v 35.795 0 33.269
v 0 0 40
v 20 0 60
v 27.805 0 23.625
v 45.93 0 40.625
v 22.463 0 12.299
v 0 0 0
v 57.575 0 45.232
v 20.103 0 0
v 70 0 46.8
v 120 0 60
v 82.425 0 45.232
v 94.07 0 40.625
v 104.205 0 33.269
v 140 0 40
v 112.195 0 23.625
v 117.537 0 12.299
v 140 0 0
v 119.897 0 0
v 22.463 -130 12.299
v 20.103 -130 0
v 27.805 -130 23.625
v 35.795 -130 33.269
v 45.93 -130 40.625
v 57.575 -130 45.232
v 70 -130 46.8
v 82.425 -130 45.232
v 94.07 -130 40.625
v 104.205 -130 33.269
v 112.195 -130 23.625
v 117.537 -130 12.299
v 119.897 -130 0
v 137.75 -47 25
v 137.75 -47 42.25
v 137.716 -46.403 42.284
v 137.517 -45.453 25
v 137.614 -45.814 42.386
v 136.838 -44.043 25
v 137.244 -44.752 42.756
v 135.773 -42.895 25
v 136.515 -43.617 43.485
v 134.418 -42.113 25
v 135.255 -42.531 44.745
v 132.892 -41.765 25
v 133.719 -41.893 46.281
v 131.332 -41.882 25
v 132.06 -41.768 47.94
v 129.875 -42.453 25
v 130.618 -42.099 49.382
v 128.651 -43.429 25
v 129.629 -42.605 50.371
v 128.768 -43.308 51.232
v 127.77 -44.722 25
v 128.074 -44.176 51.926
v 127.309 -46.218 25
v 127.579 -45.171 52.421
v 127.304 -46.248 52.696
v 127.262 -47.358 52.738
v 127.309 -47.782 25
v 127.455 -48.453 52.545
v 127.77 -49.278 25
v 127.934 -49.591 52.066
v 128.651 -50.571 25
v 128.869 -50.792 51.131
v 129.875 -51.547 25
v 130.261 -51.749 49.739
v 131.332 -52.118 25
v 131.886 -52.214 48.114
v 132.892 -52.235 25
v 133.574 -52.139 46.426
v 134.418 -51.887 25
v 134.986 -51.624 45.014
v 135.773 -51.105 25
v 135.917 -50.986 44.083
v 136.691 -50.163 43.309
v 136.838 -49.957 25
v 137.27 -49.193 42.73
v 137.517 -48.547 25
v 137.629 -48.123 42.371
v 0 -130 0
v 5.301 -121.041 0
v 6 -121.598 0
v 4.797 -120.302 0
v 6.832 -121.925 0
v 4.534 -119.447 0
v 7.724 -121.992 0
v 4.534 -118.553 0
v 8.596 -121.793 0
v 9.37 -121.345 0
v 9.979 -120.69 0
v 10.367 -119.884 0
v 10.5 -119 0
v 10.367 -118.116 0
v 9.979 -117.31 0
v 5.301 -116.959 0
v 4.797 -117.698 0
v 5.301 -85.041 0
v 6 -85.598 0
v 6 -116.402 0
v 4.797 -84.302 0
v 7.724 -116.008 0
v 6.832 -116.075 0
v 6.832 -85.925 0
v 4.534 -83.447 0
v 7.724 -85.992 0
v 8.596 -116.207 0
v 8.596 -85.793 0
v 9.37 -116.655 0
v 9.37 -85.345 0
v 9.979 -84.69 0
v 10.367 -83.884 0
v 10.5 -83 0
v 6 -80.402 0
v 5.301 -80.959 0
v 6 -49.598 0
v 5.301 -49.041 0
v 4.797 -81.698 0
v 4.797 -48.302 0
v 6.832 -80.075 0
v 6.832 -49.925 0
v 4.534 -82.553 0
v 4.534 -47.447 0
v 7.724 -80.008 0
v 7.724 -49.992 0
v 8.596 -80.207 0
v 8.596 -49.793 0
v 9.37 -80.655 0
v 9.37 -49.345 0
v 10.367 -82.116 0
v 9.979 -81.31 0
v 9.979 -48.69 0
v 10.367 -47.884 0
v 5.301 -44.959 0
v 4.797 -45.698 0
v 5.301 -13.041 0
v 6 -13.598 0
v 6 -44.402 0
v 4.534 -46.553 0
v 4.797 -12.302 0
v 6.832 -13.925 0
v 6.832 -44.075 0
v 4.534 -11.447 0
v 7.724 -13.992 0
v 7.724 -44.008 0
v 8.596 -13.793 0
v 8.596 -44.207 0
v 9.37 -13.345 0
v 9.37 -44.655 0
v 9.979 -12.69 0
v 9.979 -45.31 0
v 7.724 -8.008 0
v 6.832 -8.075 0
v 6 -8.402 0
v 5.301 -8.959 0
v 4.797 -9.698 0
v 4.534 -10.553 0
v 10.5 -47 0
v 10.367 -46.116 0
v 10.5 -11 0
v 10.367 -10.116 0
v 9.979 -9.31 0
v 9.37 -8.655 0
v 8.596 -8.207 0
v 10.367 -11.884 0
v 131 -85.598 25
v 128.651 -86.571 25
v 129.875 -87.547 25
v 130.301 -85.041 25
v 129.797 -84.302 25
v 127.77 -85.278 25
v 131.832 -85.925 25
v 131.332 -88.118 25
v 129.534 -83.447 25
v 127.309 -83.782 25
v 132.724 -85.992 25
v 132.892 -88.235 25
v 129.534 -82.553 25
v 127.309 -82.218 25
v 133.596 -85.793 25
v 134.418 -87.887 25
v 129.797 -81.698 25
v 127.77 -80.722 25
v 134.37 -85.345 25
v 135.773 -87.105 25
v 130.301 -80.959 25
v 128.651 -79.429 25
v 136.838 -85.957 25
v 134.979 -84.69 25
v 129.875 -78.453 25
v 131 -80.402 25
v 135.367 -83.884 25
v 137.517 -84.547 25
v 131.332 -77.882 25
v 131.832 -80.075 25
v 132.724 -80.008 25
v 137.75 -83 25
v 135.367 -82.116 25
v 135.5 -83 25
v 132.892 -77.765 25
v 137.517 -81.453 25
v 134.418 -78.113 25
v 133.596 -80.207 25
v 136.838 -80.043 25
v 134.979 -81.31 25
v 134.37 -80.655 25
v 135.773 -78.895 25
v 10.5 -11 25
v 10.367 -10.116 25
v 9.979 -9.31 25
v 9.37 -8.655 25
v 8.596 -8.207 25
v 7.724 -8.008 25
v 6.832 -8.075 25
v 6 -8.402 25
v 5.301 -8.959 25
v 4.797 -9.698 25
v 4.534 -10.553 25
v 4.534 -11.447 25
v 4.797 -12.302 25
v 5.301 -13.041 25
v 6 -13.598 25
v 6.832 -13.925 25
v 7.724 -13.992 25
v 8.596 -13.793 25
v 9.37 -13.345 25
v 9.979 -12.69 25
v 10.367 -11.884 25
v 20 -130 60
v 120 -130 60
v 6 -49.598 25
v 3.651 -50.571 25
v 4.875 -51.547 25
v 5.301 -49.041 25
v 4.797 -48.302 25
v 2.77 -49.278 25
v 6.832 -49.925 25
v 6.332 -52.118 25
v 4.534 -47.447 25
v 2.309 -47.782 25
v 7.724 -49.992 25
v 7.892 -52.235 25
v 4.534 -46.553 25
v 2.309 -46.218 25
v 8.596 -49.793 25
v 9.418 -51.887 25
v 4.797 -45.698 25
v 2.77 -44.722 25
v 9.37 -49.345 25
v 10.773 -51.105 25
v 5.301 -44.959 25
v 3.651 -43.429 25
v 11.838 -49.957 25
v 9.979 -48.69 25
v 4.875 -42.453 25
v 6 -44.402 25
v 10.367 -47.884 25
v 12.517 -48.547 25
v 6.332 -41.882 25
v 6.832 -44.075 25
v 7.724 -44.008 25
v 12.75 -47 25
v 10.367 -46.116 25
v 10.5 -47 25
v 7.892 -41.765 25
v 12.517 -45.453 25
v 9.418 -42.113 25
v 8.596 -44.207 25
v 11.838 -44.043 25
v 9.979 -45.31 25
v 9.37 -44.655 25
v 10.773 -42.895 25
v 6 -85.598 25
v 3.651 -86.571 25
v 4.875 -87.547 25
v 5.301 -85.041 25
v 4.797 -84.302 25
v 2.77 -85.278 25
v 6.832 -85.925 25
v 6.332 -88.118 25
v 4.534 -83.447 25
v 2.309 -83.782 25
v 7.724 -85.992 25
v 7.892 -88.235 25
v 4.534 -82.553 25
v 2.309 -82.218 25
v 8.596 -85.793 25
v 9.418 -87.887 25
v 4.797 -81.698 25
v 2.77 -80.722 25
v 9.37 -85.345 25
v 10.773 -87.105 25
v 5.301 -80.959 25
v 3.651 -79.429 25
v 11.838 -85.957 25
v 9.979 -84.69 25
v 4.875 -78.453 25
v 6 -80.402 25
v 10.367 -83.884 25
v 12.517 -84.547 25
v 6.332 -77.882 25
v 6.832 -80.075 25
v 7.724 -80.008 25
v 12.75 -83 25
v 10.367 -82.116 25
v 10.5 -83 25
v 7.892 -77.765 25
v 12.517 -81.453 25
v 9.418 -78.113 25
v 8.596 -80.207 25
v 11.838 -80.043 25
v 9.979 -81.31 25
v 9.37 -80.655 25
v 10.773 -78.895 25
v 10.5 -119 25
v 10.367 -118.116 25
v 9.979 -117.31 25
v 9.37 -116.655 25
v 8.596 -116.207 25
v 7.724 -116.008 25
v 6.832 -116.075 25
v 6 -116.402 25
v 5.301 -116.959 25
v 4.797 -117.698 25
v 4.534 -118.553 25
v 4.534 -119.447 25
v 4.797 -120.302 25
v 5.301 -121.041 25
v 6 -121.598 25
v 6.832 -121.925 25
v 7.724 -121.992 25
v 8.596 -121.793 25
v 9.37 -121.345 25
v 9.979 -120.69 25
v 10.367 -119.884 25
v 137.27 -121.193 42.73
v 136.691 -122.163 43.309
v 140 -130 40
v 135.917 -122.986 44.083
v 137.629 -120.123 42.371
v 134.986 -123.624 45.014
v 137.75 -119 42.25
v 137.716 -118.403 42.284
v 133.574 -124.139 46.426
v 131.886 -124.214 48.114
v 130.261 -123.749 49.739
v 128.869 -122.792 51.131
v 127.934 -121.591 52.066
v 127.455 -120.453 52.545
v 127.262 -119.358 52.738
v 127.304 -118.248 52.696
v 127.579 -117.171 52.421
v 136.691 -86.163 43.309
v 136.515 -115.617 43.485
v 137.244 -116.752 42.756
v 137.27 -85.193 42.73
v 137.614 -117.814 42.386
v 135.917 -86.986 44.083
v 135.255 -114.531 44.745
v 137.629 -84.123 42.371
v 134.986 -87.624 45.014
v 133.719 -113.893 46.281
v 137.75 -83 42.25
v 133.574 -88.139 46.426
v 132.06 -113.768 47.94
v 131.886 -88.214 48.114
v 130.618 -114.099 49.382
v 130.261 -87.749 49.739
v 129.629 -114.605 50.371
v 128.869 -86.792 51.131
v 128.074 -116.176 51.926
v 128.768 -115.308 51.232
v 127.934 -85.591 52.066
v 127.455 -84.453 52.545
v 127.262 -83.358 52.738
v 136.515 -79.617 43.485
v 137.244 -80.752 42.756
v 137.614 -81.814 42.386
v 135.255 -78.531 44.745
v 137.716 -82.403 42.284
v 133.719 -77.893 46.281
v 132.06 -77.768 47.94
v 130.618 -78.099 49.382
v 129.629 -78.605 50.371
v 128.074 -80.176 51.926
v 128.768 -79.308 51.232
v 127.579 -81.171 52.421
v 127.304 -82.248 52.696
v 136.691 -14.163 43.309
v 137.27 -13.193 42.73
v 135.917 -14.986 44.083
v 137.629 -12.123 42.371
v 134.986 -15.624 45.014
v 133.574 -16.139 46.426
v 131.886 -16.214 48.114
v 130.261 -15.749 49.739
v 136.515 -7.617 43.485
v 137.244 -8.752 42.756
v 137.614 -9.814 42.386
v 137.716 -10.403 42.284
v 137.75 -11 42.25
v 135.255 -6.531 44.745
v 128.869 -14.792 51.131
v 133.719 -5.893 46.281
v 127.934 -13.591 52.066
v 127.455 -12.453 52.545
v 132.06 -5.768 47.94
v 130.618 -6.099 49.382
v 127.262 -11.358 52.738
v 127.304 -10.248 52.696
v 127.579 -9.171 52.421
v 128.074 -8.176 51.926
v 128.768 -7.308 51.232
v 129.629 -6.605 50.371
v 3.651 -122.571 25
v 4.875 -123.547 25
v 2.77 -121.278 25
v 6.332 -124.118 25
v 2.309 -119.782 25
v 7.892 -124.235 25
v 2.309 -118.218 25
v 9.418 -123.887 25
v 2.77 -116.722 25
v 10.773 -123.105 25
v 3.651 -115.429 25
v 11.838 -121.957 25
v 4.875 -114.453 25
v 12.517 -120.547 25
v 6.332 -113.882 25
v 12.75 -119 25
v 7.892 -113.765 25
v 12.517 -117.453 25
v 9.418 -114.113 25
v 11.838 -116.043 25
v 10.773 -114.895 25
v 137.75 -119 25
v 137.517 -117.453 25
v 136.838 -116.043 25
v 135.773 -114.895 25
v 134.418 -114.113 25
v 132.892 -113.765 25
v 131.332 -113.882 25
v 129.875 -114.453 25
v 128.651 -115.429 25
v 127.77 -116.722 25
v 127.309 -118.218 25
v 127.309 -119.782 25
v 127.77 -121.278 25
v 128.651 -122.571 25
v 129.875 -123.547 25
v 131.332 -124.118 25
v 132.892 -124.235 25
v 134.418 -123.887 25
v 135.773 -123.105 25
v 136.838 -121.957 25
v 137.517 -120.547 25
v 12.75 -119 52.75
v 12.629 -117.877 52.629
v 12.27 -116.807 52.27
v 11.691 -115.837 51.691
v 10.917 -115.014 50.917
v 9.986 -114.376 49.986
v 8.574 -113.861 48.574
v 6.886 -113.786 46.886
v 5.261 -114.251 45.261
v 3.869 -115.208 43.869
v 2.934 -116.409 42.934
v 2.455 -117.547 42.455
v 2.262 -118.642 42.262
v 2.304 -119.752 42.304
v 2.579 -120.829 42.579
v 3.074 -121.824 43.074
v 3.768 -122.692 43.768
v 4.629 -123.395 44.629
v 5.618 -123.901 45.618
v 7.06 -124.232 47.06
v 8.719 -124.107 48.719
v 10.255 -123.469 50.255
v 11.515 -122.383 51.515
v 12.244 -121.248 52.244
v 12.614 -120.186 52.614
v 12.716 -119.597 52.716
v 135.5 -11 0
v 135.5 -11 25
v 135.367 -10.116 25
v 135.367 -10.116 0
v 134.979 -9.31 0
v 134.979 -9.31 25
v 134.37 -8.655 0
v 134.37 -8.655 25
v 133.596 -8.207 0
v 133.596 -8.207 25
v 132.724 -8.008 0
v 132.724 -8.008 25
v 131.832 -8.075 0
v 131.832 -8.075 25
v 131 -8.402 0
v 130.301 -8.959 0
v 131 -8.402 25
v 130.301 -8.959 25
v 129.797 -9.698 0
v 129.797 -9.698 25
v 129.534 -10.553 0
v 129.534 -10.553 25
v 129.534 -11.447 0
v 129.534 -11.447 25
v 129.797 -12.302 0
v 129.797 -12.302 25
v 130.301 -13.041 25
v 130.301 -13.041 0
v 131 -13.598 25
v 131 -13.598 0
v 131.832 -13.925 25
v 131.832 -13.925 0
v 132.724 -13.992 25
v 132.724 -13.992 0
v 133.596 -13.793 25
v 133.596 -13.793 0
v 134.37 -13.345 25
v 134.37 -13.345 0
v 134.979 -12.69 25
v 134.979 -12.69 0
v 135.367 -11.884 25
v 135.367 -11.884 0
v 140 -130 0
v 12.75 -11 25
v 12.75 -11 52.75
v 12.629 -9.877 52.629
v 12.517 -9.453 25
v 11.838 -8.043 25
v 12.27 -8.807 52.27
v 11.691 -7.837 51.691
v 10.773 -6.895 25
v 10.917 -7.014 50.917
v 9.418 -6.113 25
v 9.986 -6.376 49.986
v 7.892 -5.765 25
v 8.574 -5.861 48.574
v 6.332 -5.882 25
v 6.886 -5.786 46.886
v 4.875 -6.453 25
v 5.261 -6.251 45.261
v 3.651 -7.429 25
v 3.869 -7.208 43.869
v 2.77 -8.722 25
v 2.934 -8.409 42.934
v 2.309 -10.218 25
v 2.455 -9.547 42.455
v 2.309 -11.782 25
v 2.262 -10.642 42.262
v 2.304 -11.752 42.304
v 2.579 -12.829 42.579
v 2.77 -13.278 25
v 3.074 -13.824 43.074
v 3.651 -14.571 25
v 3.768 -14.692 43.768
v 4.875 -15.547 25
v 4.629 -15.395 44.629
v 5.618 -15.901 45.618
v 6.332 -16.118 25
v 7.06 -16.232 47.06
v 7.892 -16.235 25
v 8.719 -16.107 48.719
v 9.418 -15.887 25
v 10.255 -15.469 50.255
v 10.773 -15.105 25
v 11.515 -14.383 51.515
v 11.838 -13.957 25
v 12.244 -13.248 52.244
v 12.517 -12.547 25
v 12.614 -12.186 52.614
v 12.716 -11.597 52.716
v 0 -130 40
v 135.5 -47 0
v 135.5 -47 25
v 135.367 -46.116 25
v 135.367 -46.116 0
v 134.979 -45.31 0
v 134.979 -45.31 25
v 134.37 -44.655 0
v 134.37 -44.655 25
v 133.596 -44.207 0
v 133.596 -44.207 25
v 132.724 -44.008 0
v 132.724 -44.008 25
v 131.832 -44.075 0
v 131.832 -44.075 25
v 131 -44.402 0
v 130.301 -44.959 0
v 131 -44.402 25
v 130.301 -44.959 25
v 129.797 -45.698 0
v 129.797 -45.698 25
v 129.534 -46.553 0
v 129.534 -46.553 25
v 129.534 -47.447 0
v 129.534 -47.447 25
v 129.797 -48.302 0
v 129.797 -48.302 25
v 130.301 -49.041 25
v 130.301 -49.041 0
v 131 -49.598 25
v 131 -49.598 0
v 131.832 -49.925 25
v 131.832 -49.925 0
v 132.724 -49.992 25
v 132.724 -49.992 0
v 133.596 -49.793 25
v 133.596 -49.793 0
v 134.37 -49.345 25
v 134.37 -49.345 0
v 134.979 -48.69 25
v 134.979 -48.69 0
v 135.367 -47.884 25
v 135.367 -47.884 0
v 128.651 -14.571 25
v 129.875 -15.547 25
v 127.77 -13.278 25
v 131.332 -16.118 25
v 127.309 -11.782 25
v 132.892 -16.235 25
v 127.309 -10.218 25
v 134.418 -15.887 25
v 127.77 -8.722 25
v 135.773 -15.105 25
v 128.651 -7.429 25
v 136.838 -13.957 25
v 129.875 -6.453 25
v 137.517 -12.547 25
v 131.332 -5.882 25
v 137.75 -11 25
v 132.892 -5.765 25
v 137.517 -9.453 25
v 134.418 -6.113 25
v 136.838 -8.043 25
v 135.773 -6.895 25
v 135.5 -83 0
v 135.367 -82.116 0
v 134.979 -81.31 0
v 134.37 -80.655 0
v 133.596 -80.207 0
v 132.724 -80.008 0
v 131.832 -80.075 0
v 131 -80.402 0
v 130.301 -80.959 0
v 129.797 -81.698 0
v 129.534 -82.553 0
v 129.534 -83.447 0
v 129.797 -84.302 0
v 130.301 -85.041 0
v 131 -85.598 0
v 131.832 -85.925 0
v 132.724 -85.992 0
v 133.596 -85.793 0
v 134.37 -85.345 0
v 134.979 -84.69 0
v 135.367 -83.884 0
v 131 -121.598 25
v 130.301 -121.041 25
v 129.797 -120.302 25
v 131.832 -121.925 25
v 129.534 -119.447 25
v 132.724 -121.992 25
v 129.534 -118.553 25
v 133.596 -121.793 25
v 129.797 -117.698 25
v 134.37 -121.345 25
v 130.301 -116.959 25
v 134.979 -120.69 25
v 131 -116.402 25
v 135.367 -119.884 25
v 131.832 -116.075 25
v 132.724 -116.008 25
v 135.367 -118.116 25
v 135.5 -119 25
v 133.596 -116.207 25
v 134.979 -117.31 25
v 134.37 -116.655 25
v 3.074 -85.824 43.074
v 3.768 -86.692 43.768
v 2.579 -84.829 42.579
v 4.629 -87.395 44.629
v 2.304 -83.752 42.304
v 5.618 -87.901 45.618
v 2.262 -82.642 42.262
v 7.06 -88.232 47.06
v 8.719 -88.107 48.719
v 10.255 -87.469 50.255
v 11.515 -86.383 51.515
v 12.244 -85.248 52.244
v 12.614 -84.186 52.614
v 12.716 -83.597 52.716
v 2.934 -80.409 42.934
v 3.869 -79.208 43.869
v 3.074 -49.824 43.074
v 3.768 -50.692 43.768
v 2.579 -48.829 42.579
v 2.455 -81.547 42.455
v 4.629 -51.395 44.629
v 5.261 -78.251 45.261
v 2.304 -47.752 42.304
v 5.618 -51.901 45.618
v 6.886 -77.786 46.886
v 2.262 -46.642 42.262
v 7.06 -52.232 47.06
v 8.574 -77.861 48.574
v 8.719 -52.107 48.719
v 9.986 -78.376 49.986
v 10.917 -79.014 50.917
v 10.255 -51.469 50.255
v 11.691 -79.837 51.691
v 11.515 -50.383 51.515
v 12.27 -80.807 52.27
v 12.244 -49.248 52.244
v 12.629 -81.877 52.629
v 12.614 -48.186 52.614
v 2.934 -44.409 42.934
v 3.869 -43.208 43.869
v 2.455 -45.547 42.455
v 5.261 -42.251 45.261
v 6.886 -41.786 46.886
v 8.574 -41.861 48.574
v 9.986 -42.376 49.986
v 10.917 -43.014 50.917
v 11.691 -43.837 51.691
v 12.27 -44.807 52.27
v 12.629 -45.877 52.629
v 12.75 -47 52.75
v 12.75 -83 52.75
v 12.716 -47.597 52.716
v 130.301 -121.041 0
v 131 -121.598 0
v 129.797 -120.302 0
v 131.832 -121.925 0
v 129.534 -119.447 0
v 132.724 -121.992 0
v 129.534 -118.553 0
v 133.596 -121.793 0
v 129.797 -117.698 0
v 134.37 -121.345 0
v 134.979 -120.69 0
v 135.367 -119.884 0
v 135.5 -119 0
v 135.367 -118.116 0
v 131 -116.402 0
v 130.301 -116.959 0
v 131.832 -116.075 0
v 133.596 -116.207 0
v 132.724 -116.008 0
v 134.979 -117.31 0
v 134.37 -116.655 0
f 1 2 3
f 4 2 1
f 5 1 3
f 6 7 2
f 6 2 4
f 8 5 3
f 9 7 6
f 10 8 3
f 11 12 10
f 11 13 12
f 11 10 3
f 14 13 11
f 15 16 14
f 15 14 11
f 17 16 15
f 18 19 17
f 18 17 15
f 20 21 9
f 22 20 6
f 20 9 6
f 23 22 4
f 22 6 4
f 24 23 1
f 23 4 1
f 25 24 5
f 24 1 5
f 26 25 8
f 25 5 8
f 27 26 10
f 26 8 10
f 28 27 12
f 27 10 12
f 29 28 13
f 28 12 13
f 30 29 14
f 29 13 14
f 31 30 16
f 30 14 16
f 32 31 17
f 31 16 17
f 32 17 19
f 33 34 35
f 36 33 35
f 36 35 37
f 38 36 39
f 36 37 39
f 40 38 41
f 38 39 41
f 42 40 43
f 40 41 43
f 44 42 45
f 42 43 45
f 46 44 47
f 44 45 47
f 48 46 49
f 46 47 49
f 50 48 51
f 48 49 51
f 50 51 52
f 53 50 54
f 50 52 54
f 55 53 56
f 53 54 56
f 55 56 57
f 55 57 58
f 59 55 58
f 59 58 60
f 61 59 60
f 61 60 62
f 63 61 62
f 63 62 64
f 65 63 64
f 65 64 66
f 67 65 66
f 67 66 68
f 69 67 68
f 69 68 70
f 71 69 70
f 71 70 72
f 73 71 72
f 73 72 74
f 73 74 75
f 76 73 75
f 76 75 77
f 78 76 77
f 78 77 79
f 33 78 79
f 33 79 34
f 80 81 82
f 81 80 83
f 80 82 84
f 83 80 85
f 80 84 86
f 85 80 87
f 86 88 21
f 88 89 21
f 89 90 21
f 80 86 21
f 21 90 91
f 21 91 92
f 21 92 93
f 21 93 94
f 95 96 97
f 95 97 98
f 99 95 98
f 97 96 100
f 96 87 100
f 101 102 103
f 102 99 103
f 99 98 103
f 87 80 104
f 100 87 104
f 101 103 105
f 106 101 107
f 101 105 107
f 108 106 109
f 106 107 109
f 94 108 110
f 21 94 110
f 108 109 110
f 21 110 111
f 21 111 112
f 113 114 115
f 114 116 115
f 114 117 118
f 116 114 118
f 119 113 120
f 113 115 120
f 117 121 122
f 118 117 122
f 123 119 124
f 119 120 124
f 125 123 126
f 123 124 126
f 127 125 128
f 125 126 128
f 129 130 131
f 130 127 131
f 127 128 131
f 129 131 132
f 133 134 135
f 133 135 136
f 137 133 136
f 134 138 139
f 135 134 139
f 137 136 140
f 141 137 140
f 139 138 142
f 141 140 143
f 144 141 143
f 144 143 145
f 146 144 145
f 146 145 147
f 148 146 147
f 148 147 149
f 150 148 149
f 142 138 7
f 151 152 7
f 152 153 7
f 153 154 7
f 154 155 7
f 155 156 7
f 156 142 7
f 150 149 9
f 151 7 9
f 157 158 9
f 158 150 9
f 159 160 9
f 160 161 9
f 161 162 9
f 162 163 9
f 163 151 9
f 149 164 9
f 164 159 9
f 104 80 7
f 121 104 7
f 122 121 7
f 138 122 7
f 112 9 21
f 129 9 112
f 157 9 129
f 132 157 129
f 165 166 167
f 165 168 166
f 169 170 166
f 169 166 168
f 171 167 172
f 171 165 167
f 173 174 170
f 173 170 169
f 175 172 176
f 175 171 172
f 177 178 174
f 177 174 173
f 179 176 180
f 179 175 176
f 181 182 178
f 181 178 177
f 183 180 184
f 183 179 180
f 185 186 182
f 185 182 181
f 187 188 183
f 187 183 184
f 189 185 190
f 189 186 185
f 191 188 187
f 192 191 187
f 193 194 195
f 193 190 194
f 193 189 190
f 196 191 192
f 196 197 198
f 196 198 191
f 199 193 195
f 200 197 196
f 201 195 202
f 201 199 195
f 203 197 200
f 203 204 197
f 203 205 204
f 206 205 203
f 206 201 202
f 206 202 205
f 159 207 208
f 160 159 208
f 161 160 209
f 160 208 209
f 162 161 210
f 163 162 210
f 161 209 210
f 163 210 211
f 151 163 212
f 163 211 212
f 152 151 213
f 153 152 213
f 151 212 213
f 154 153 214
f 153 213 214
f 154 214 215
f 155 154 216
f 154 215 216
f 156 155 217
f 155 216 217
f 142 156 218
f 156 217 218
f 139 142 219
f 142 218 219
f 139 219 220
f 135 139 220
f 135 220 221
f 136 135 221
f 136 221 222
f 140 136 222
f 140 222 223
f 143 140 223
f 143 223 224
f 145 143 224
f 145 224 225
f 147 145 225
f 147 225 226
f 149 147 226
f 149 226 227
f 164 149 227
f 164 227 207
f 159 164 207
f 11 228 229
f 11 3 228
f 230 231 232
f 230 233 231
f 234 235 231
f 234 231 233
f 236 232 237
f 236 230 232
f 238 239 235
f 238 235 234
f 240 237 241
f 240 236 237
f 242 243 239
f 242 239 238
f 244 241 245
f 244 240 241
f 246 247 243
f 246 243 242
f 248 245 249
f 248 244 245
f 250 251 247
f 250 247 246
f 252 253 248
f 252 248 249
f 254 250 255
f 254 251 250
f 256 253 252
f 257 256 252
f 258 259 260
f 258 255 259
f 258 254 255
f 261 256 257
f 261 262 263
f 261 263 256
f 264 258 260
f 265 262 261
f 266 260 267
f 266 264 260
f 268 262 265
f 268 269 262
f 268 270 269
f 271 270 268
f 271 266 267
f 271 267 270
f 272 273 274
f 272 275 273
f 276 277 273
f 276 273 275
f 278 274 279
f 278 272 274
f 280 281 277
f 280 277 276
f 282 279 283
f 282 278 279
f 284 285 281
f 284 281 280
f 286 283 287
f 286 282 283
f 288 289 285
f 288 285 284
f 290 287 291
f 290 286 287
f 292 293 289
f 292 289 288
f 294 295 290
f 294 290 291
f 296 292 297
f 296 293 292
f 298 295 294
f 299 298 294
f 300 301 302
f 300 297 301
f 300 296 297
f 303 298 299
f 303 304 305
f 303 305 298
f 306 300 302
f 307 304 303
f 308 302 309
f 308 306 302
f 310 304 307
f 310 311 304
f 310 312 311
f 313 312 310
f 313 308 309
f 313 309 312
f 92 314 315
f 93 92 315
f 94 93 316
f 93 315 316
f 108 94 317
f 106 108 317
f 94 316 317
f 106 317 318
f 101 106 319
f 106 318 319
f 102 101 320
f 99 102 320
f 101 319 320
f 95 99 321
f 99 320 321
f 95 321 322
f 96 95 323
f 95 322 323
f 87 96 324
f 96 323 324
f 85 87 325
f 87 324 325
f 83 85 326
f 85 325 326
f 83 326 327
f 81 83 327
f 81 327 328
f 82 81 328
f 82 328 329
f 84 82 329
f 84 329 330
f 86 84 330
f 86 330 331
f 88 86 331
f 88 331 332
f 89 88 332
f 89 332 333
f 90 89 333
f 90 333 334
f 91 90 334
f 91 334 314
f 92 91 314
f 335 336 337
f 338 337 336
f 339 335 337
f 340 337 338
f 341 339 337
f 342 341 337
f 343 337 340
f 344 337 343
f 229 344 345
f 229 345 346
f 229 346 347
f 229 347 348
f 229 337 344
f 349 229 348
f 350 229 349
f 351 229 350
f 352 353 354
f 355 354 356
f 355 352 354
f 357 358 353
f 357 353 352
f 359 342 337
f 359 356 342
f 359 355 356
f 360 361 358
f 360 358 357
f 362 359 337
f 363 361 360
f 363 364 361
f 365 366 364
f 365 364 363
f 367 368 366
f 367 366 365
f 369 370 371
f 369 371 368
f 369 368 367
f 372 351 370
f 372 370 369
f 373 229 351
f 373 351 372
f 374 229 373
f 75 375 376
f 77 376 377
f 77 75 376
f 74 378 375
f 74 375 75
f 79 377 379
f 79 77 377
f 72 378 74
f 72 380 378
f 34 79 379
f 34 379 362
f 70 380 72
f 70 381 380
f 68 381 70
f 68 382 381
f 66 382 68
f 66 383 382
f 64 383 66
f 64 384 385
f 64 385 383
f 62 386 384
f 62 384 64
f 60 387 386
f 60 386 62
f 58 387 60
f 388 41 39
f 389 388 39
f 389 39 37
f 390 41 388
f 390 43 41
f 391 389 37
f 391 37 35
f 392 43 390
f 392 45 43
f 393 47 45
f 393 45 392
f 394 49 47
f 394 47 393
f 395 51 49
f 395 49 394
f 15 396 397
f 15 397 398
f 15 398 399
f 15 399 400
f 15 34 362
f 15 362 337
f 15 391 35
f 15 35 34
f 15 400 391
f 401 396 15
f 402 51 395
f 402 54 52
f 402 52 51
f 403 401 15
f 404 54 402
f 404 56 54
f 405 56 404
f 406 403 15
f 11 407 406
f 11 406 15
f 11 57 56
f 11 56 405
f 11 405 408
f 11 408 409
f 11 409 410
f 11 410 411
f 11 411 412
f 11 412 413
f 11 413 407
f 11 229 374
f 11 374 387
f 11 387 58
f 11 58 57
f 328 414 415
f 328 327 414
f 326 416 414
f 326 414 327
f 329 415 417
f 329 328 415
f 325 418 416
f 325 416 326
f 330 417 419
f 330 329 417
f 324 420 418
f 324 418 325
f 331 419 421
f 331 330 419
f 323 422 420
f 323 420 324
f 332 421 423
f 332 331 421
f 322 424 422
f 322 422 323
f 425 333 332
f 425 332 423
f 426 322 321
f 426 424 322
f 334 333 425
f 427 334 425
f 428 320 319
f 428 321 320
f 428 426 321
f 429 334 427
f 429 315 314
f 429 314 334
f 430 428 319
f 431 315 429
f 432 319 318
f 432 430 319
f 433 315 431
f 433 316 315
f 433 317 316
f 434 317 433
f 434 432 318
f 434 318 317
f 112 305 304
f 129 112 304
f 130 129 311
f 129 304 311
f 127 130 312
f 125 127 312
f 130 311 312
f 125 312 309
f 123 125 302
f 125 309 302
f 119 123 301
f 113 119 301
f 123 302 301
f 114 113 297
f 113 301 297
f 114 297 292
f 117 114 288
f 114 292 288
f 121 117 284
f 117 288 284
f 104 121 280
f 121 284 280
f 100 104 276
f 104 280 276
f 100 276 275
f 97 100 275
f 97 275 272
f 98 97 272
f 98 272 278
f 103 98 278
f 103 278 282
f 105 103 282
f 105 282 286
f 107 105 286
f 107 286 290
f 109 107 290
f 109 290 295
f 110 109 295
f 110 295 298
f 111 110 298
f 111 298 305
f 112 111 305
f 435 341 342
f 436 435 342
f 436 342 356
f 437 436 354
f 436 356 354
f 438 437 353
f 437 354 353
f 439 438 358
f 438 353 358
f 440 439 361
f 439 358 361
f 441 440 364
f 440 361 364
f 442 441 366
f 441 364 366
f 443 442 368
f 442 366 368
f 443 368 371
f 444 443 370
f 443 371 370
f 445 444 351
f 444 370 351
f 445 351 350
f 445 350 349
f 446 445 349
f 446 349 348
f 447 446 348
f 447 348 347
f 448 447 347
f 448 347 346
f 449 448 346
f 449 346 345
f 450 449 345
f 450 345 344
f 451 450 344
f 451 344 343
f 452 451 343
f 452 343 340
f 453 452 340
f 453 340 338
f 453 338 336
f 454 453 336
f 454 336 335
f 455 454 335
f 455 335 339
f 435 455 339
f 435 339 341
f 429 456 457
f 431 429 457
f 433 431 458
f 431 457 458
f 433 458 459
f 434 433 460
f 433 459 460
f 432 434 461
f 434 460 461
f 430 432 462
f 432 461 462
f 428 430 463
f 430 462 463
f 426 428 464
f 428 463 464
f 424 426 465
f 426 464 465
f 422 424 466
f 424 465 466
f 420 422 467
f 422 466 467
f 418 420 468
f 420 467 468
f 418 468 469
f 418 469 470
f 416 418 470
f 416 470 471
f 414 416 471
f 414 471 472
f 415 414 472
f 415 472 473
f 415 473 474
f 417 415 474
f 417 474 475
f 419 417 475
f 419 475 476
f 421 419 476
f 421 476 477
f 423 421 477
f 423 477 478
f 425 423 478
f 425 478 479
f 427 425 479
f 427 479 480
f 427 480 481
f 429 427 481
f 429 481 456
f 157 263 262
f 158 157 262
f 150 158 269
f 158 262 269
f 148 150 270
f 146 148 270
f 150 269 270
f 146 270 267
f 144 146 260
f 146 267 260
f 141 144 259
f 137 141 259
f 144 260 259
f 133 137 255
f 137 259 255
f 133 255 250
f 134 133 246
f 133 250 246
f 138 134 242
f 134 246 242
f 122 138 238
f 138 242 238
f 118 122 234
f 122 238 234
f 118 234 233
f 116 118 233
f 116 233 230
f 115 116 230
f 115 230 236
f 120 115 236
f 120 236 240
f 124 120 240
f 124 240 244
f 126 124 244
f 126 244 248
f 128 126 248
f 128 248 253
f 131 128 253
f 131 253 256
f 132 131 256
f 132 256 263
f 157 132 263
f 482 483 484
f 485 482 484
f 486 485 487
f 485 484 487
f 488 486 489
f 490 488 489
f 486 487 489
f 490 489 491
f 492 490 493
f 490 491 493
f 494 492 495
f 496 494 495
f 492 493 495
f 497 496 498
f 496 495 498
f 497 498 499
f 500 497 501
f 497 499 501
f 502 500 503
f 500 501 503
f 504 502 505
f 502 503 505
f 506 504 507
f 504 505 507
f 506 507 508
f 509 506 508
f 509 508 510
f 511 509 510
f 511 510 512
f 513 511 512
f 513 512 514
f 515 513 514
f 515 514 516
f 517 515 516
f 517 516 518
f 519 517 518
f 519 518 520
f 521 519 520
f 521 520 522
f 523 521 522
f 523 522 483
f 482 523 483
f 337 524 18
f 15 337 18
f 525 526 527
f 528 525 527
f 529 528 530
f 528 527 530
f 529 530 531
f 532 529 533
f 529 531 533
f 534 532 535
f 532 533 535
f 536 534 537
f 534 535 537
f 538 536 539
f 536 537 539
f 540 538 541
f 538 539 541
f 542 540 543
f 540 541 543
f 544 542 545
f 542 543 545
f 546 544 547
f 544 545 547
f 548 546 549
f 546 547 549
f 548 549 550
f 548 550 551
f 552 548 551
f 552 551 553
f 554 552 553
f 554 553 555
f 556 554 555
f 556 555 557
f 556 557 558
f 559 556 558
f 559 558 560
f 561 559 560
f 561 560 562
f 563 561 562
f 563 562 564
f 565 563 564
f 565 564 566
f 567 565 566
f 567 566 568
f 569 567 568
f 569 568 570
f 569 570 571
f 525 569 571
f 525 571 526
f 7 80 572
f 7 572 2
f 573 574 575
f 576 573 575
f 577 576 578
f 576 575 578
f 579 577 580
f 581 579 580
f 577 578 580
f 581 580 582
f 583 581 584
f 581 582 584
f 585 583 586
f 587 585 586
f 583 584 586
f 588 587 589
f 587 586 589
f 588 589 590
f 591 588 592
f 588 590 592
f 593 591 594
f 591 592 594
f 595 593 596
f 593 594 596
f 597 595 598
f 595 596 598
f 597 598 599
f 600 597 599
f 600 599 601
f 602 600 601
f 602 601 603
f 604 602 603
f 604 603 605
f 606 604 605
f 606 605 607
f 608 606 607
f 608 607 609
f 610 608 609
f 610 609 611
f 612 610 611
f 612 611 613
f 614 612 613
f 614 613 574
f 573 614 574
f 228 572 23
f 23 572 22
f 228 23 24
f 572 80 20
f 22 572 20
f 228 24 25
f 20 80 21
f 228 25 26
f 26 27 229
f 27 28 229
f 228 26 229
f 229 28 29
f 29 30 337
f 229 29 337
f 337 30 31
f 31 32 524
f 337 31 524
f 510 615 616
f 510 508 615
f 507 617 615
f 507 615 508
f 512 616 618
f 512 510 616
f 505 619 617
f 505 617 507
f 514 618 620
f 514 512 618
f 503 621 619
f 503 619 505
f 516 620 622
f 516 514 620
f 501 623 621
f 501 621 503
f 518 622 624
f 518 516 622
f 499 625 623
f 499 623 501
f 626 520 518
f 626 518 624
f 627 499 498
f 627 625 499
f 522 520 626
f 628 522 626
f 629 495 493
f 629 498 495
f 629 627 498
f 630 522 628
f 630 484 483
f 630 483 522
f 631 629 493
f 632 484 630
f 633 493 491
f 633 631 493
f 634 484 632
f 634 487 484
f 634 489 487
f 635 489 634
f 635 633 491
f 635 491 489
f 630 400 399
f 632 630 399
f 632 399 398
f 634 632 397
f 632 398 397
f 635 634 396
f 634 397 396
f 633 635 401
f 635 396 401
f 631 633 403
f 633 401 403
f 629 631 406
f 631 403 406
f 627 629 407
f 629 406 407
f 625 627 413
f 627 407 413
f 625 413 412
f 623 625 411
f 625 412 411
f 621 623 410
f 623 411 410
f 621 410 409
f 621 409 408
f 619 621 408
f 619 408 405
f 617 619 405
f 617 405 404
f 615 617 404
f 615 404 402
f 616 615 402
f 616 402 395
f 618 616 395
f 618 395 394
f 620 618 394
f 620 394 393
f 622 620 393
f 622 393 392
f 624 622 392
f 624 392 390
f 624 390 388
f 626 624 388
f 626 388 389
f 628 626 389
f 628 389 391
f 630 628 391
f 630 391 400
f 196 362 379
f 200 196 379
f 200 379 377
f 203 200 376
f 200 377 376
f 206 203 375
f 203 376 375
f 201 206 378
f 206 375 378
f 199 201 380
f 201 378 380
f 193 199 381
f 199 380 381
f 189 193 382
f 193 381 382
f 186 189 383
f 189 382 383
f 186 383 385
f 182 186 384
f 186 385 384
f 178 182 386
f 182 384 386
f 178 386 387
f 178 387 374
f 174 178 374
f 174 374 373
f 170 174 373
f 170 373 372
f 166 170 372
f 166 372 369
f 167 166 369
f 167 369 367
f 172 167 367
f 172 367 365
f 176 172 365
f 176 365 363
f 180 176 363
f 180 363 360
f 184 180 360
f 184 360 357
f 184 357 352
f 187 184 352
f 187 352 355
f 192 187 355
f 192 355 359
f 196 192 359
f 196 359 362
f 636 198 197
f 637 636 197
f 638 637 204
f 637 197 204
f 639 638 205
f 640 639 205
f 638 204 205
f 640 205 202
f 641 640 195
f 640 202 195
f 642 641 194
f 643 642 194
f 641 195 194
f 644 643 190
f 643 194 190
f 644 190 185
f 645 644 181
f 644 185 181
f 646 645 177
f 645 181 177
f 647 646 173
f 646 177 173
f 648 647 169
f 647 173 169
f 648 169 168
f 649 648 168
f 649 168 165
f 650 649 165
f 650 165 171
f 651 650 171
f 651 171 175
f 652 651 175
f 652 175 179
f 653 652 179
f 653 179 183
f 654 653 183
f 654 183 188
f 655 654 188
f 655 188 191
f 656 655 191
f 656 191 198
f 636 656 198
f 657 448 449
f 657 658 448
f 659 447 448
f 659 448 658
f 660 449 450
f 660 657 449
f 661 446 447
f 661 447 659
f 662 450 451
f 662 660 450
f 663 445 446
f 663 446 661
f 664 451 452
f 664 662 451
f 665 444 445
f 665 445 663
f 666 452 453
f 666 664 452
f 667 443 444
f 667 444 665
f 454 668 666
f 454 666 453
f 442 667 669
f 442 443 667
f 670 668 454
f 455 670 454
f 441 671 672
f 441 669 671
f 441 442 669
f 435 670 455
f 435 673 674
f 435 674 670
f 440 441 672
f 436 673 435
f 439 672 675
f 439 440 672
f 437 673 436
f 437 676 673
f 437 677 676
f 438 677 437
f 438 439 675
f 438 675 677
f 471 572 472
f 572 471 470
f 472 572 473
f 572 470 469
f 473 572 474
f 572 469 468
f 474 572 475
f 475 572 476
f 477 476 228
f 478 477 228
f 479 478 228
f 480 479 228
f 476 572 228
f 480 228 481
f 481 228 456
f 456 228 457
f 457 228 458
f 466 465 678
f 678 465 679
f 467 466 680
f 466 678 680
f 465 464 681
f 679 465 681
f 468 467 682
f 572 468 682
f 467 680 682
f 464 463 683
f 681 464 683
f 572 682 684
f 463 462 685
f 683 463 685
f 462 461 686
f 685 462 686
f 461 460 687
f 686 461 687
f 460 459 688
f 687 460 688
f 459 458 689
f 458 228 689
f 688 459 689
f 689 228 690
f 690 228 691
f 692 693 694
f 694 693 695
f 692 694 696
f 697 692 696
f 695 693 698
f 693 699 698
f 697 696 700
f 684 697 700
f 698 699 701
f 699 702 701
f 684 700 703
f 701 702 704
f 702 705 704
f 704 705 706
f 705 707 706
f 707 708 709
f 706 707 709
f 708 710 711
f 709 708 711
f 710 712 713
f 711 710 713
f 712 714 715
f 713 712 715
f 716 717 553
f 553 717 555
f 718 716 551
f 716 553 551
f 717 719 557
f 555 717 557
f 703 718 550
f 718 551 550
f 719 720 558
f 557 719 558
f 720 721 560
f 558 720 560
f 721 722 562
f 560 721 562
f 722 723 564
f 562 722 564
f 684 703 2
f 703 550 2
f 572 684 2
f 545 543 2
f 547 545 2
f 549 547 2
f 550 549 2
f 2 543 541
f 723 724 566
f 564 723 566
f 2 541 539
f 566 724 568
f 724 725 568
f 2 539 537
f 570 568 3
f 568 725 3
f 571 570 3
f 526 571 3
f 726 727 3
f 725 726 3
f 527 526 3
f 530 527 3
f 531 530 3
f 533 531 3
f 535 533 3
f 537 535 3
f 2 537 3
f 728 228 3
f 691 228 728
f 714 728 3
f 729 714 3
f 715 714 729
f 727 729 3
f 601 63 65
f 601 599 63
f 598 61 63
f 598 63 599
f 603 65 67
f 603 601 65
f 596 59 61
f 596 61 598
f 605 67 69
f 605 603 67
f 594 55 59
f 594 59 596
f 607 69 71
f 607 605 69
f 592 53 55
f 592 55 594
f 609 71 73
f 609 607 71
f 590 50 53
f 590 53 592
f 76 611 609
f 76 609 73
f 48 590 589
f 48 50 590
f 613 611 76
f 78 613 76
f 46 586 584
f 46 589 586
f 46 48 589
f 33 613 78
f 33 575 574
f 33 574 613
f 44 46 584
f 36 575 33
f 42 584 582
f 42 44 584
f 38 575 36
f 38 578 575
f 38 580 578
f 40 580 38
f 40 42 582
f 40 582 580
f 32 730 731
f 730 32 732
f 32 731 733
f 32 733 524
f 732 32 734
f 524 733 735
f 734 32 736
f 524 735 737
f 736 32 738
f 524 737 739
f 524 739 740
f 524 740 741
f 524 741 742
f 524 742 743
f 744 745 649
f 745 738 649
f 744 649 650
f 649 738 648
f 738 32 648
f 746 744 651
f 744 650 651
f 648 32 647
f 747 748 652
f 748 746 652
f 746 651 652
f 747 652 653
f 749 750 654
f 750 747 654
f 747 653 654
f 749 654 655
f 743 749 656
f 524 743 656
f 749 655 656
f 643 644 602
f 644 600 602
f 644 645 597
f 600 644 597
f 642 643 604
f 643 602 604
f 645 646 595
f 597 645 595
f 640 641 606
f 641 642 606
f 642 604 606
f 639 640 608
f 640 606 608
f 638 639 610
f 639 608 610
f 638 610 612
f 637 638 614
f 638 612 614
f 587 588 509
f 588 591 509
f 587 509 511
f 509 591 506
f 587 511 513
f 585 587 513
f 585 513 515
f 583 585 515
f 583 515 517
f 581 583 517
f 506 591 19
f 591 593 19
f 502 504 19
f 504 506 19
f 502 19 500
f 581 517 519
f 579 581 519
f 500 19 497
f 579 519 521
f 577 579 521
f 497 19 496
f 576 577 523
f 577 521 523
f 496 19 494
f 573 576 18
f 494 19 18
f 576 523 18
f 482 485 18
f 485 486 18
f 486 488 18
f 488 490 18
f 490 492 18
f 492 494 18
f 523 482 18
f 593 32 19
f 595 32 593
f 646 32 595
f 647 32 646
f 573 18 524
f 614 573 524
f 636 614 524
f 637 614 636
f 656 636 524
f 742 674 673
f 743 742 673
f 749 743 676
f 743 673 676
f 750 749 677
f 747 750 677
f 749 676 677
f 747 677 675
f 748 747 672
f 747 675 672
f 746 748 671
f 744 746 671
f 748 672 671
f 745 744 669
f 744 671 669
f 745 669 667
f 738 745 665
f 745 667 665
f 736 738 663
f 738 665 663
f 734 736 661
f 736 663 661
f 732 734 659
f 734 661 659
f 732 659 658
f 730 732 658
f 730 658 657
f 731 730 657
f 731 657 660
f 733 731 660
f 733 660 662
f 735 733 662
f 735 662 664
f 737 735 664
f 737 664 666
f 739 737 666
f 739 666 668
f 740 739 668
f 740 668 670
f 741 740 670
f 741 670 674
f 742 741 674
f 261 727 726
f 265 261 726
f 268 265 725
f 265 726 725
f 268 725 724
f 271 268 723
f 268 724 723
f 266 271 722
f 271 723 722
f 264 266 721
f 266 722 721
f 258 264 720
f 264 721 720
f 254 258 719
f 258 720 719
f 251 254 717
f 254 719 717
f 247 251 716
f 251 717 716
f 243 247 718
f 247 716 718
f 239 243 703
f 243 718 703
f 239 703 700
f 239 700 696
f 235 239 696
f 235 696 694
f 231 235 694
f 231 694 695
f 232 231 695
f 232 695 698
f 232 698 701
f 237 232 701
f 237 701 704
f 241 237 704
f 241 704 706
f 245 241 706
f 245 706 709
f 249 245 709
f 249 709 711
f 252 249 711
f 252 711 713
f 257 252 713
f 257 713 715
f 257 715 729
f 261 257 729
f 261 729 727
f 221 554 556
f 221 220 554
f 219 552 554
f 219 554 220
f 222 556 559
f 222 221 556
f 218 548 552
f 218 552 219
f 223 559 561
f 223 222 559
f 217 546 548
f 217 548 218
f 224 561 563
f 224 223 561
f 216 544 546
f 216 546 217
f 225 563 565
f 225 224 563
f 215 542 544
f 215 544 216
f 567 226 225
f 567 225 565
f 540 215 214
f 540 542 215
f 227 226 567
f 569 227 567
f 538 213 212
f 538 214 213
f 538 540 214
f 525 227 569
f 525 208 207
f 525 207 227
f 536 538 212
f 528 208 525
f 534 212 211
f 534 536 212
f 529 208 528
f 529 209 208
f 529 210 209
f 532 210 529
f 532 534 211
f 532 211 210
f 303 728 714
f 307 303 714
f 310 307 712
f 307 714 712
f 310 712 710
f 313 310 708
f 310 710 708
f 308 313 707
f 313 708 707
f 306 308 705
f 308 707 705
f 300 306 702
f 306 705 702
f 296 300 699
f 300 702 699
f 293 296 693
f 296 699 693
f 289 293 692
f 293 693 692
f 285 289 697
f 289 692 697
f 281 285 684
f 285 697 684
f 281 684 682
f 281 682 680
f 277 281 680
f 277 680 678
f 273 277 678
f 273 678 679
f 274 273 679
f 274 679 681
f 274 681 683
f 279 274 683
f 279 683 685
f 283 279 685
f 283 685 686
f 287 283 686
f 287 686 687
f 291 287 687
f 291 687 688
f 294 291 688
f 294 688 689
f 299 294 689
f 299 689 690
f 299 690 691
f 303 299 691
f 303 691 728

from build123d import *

# Parameters (mm, degrees)
SKETCH_1_W          = 140
SKETCH_1_H          = 130
EXTRUDE_1_DEPTH     = 60
CHAMFER_1_SIZE      = 20
SKETCH_2_R          = 50
CUT_EXTRUDE_1_DEPTH = 131
SKETCH_7_R          = 3
CUT_EXTRUDE_2_DEPTH = 61
SKETCH_8_R          = 5.25
CUT_EXTRUDE_3_DEPTH = 35


with BuildPart() as part:
    # 草图1 → 凸台-拉伸1 (new body)
    with BuildSketch(Plane.XY):
        with Locations((70, -65)):
            Rectangle(SKETCH_1_W, SKETCH_1_H)
    extrude(amount=EXTRUDE_1_DEPTH)

    # 倒角1
    chamfer_1_edges = [part.edges().sort_by_distance(p)[0] for p in [
        (140, -65, 60),
        (0, -65, 60),
    ]]
    chamfer(chamfer_1_edges, length=CHAMFER_1_SIZE)

    # 草图2 → 切除-拉伸1 (cut, through all)
    with BuildSketch(Plane(origin=(0, 0, 0), x_dir=(1, 0, 0), z_dir=(0, 1, 0))):
        with Locations((70, 3.2)):
            Circle(SKETCH_2_R)
    extrude(amount=-CUT_EXTRUDE_1_DEPTH, mode=Mode.SUBTRACT)

    # 草图7 → 切除-拉伸2 (cut, through all)
    with BuildSketch(Plane.XY.offset(60)):
        with Locations((7.5, -11)):
            Circle(SKETCH_7_R)
        with Locations((132.5, -11)):
            Circle(SKETCH_7_R)
        with Locations((132.5, -47)):
            Circle(SKETCH_7_R)
        with Locations((132.5, -83)):
            Circle(SKETCH_7_R)
        with Locations((132.5, -119)):
            Circle(SKETCH_7_R)
        with Locations((7.5, -47)):
            Circle(SKETCH_7_R)
        with Locations((7.5, -83)):
            Circle(SKETCH_7_R)
        with Locations((7.5, -119)):
            Circle(SKETCH_7_R)
    extrude(amount=-CUT_EXTRUDE_2_DEPTH, mode=Mode.SUBTRACT)

    # 草图8 → 切除-拉伸3 (cut)
    with BuildSketch(Plane.XY.offset(60)):
        with Locations((7.5, -11)):
            Circle(SKETCH_8_R)
        with Locations((132.5, -11)):
            Circle(SKETCH_8_R)
        with Locations((132.5, -47)):
            Circle(SKETCH_8_R)
        with Locations((132.5, -83)):
            Circle(SKETCH_8_R)
        with Locations((132.5, -119)):
            Circle(SKETCH_8_R)
        with Locations((7.5, -47)):
            Circle(SKETCH_8_R)
        with Locations((7.5, -83)):
            Circle(SKETCH_8_R)
        with Locations((7.5, -119)):
            Circle(SKETCH_8_R)
    extrude(amount=-CUT_EXTRUDE_3_DEPTH, mode=Mode.SUBTRACT)


solid = part.part
